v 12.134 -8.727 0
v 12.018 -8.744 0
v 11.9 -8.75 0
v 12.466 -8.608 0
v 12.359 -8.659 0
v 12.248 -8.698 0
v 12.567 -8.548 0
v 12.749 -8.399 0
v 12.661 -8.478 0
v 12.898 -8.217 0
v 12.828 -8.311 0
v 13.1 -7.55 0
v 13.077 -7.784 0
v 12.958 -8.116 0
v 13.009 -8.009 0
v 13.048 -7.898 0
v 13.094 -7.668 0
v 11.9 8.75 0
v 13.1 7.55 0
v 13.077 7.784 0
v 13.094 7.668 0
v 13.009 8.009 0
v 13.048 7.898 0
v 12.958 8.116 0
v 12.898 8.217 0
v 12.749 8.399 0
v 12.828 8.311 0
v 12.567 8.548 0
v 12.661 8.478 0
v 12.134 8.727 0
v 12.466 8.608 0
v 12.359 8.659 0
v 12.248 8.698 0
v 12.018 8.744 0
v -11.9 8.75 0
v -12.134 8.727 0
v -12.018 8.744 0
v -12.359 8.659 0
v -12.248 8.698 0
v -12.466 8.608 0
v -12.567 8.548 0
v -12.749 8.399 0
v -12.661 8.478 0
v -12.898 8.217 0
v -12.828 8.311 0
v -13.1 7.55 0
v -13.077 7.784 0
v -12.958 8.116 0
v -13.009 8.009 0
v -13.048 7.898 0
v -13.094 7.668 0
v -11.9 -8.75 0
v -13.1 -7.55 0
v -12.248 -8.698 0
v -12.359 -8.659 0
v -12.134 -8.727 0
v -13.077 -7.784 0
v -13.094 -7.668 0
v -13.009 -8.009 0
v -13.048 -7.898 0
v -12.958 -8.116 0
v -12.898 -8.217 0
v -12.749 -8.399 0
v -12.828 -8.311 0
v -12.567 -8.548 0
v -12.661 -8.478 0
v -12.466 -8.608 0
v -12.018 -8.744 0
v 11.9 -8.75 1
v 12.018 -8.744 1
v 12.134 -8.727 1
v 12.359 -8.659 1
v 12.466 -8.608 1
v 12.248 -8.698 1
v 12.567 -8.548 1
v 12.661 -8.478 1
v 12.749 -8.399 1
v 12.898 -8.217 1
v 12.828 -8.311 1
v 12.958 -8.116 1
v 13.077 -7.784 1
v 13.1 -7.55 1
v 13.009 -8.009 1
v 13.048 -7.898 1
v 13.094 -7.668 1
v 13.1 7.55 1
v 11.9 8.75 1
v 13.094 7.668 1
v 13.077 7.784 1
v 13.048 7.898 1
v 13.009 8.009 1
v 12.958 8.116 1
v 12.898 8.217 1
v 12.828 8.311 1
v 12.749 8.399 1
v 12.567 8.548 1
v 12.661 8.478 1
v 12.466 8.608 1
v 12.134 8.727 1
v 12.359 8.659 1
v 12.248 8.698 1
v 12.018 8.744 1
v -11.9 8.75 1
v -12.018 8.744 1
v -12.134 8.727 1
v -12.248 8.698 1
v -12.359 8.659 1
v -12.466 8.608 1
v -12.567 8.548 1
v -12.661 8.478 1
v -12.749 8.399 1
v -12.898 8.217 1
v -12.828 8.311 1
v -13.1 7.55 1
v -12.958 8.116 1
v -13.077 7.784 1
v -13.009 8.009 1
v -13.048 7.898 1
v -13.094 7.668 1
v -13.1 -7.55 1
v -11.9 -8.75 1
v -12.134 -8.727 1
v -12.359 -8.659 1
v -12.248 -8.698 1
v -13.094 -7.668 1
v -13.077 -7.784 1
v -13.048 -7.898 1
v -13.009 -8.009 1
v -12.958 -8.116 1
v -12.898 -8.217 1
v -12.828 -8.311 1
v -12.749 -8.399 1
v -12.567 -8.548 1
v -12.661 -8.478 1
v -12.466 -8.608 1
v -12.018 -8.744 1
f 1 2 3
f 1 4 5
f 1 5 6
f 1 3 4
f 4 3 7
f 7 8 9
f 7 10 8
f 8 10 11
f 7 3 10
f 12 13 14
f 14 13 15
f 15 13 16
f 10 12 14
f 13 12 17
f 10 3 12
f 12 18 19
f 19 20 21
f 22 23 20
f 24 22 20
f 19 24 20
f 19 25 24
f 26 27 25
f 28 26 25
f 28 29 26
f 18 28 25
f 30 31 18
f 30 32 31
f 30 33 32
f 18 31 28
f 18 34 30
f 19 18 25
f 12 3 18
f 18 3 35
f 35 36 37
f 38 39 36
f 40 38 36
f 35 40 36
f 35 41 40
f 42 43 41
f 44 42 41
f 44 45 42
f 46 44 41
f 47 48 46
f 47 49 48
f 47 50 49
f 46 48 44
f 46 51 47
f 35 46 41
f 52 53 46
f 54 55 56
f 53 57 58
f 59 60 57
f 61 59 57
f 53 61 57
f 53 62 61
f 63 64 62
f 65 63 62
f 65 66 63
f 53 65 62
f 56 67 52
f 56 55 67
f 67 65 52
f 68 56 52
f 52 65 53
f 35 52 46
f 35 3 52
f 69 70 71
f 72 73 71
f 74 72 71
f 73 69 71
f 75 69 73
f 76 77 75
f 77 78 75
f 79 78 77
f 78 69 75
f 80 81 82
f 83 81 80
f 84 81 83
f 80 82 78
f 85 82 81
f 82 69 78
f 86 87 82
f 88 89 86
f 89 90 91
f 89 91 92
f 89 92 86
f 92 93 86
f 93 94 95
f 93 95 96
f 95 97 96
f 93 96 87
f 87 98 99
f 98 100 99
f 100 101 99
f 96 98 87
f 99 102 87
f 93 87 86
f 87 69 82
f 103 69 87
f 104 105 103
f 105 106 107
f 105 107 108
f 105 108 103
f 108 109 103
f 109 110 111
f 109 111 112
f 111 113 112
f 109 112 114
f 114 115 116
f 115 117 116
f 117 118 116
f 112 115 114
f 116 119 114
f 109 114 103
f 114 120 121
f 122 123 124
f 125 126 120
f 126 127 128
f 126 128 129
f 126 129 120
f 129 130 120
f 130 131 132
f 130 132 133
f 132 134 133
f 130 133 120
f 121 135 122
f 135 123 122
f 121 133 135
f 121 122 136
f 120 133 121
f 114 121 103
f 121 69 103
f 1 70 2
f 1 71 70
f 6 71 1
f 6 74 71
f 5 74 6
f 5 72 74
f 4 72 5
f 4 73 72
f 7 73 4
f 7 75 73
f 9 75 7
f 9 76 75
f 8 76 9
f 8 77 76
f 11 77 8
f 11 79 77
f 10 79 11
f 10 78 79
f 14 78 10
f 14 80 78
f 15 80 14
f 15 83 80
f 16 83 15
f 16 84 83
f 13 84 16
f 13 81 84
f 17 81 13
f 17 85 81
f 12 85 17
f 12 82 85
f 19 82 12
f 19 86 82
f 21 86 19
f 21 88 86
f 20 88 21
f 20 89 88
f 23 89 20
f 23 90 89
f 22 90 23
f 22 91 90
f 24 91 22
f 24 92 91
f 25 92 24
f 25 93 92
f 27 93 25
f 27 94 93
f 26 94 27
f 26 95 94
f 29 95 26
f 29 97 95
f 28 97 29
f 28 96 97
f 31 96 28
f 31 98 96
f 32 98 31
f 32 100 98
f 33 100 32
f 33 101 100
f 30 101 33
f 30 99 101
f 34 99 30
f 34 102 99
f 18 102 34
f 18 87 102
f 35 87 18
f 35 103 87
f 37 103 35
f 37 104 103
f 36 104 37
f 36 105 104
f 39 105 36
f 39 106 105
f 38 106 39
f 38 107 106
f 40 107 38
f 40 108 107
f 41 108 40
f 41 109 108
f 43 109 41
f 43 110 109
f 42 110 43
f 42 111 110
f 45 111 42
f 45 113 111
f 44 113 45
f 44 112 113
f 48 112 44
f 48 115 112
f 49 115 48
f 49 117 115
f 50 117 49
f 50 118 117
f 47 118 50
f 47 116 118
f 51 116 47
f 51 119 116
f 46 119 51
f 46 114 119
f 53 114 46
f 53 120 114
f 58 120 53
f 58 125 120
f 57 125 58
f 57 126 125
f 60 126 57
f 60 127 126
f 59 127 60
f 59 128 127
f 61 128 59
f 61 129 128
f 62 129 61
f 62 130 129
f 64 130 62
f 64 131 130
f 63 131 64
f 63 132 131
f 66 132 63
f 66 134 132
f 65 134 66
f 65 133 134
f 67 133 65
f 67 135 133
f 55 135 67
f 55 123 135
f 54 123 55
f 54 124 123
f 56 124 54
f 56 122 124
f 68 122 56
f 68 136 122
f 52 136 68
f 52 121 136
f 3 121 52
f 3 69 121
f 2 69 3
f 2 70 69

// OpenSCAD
$fn = 64;

module battery_charger_module(len=26.2, wid=17.5, thick=1.0, corner_r=1.2) {
    corner_r2 = min(corner_r, min(len, wid)/2 - 0.01);
    linear_extrude(height=thick)
        offset(r=corner_r2)
            square([len - 2*corner_r2, wid - 2*corner_r2], center=true);
}

battery_charger_module();
